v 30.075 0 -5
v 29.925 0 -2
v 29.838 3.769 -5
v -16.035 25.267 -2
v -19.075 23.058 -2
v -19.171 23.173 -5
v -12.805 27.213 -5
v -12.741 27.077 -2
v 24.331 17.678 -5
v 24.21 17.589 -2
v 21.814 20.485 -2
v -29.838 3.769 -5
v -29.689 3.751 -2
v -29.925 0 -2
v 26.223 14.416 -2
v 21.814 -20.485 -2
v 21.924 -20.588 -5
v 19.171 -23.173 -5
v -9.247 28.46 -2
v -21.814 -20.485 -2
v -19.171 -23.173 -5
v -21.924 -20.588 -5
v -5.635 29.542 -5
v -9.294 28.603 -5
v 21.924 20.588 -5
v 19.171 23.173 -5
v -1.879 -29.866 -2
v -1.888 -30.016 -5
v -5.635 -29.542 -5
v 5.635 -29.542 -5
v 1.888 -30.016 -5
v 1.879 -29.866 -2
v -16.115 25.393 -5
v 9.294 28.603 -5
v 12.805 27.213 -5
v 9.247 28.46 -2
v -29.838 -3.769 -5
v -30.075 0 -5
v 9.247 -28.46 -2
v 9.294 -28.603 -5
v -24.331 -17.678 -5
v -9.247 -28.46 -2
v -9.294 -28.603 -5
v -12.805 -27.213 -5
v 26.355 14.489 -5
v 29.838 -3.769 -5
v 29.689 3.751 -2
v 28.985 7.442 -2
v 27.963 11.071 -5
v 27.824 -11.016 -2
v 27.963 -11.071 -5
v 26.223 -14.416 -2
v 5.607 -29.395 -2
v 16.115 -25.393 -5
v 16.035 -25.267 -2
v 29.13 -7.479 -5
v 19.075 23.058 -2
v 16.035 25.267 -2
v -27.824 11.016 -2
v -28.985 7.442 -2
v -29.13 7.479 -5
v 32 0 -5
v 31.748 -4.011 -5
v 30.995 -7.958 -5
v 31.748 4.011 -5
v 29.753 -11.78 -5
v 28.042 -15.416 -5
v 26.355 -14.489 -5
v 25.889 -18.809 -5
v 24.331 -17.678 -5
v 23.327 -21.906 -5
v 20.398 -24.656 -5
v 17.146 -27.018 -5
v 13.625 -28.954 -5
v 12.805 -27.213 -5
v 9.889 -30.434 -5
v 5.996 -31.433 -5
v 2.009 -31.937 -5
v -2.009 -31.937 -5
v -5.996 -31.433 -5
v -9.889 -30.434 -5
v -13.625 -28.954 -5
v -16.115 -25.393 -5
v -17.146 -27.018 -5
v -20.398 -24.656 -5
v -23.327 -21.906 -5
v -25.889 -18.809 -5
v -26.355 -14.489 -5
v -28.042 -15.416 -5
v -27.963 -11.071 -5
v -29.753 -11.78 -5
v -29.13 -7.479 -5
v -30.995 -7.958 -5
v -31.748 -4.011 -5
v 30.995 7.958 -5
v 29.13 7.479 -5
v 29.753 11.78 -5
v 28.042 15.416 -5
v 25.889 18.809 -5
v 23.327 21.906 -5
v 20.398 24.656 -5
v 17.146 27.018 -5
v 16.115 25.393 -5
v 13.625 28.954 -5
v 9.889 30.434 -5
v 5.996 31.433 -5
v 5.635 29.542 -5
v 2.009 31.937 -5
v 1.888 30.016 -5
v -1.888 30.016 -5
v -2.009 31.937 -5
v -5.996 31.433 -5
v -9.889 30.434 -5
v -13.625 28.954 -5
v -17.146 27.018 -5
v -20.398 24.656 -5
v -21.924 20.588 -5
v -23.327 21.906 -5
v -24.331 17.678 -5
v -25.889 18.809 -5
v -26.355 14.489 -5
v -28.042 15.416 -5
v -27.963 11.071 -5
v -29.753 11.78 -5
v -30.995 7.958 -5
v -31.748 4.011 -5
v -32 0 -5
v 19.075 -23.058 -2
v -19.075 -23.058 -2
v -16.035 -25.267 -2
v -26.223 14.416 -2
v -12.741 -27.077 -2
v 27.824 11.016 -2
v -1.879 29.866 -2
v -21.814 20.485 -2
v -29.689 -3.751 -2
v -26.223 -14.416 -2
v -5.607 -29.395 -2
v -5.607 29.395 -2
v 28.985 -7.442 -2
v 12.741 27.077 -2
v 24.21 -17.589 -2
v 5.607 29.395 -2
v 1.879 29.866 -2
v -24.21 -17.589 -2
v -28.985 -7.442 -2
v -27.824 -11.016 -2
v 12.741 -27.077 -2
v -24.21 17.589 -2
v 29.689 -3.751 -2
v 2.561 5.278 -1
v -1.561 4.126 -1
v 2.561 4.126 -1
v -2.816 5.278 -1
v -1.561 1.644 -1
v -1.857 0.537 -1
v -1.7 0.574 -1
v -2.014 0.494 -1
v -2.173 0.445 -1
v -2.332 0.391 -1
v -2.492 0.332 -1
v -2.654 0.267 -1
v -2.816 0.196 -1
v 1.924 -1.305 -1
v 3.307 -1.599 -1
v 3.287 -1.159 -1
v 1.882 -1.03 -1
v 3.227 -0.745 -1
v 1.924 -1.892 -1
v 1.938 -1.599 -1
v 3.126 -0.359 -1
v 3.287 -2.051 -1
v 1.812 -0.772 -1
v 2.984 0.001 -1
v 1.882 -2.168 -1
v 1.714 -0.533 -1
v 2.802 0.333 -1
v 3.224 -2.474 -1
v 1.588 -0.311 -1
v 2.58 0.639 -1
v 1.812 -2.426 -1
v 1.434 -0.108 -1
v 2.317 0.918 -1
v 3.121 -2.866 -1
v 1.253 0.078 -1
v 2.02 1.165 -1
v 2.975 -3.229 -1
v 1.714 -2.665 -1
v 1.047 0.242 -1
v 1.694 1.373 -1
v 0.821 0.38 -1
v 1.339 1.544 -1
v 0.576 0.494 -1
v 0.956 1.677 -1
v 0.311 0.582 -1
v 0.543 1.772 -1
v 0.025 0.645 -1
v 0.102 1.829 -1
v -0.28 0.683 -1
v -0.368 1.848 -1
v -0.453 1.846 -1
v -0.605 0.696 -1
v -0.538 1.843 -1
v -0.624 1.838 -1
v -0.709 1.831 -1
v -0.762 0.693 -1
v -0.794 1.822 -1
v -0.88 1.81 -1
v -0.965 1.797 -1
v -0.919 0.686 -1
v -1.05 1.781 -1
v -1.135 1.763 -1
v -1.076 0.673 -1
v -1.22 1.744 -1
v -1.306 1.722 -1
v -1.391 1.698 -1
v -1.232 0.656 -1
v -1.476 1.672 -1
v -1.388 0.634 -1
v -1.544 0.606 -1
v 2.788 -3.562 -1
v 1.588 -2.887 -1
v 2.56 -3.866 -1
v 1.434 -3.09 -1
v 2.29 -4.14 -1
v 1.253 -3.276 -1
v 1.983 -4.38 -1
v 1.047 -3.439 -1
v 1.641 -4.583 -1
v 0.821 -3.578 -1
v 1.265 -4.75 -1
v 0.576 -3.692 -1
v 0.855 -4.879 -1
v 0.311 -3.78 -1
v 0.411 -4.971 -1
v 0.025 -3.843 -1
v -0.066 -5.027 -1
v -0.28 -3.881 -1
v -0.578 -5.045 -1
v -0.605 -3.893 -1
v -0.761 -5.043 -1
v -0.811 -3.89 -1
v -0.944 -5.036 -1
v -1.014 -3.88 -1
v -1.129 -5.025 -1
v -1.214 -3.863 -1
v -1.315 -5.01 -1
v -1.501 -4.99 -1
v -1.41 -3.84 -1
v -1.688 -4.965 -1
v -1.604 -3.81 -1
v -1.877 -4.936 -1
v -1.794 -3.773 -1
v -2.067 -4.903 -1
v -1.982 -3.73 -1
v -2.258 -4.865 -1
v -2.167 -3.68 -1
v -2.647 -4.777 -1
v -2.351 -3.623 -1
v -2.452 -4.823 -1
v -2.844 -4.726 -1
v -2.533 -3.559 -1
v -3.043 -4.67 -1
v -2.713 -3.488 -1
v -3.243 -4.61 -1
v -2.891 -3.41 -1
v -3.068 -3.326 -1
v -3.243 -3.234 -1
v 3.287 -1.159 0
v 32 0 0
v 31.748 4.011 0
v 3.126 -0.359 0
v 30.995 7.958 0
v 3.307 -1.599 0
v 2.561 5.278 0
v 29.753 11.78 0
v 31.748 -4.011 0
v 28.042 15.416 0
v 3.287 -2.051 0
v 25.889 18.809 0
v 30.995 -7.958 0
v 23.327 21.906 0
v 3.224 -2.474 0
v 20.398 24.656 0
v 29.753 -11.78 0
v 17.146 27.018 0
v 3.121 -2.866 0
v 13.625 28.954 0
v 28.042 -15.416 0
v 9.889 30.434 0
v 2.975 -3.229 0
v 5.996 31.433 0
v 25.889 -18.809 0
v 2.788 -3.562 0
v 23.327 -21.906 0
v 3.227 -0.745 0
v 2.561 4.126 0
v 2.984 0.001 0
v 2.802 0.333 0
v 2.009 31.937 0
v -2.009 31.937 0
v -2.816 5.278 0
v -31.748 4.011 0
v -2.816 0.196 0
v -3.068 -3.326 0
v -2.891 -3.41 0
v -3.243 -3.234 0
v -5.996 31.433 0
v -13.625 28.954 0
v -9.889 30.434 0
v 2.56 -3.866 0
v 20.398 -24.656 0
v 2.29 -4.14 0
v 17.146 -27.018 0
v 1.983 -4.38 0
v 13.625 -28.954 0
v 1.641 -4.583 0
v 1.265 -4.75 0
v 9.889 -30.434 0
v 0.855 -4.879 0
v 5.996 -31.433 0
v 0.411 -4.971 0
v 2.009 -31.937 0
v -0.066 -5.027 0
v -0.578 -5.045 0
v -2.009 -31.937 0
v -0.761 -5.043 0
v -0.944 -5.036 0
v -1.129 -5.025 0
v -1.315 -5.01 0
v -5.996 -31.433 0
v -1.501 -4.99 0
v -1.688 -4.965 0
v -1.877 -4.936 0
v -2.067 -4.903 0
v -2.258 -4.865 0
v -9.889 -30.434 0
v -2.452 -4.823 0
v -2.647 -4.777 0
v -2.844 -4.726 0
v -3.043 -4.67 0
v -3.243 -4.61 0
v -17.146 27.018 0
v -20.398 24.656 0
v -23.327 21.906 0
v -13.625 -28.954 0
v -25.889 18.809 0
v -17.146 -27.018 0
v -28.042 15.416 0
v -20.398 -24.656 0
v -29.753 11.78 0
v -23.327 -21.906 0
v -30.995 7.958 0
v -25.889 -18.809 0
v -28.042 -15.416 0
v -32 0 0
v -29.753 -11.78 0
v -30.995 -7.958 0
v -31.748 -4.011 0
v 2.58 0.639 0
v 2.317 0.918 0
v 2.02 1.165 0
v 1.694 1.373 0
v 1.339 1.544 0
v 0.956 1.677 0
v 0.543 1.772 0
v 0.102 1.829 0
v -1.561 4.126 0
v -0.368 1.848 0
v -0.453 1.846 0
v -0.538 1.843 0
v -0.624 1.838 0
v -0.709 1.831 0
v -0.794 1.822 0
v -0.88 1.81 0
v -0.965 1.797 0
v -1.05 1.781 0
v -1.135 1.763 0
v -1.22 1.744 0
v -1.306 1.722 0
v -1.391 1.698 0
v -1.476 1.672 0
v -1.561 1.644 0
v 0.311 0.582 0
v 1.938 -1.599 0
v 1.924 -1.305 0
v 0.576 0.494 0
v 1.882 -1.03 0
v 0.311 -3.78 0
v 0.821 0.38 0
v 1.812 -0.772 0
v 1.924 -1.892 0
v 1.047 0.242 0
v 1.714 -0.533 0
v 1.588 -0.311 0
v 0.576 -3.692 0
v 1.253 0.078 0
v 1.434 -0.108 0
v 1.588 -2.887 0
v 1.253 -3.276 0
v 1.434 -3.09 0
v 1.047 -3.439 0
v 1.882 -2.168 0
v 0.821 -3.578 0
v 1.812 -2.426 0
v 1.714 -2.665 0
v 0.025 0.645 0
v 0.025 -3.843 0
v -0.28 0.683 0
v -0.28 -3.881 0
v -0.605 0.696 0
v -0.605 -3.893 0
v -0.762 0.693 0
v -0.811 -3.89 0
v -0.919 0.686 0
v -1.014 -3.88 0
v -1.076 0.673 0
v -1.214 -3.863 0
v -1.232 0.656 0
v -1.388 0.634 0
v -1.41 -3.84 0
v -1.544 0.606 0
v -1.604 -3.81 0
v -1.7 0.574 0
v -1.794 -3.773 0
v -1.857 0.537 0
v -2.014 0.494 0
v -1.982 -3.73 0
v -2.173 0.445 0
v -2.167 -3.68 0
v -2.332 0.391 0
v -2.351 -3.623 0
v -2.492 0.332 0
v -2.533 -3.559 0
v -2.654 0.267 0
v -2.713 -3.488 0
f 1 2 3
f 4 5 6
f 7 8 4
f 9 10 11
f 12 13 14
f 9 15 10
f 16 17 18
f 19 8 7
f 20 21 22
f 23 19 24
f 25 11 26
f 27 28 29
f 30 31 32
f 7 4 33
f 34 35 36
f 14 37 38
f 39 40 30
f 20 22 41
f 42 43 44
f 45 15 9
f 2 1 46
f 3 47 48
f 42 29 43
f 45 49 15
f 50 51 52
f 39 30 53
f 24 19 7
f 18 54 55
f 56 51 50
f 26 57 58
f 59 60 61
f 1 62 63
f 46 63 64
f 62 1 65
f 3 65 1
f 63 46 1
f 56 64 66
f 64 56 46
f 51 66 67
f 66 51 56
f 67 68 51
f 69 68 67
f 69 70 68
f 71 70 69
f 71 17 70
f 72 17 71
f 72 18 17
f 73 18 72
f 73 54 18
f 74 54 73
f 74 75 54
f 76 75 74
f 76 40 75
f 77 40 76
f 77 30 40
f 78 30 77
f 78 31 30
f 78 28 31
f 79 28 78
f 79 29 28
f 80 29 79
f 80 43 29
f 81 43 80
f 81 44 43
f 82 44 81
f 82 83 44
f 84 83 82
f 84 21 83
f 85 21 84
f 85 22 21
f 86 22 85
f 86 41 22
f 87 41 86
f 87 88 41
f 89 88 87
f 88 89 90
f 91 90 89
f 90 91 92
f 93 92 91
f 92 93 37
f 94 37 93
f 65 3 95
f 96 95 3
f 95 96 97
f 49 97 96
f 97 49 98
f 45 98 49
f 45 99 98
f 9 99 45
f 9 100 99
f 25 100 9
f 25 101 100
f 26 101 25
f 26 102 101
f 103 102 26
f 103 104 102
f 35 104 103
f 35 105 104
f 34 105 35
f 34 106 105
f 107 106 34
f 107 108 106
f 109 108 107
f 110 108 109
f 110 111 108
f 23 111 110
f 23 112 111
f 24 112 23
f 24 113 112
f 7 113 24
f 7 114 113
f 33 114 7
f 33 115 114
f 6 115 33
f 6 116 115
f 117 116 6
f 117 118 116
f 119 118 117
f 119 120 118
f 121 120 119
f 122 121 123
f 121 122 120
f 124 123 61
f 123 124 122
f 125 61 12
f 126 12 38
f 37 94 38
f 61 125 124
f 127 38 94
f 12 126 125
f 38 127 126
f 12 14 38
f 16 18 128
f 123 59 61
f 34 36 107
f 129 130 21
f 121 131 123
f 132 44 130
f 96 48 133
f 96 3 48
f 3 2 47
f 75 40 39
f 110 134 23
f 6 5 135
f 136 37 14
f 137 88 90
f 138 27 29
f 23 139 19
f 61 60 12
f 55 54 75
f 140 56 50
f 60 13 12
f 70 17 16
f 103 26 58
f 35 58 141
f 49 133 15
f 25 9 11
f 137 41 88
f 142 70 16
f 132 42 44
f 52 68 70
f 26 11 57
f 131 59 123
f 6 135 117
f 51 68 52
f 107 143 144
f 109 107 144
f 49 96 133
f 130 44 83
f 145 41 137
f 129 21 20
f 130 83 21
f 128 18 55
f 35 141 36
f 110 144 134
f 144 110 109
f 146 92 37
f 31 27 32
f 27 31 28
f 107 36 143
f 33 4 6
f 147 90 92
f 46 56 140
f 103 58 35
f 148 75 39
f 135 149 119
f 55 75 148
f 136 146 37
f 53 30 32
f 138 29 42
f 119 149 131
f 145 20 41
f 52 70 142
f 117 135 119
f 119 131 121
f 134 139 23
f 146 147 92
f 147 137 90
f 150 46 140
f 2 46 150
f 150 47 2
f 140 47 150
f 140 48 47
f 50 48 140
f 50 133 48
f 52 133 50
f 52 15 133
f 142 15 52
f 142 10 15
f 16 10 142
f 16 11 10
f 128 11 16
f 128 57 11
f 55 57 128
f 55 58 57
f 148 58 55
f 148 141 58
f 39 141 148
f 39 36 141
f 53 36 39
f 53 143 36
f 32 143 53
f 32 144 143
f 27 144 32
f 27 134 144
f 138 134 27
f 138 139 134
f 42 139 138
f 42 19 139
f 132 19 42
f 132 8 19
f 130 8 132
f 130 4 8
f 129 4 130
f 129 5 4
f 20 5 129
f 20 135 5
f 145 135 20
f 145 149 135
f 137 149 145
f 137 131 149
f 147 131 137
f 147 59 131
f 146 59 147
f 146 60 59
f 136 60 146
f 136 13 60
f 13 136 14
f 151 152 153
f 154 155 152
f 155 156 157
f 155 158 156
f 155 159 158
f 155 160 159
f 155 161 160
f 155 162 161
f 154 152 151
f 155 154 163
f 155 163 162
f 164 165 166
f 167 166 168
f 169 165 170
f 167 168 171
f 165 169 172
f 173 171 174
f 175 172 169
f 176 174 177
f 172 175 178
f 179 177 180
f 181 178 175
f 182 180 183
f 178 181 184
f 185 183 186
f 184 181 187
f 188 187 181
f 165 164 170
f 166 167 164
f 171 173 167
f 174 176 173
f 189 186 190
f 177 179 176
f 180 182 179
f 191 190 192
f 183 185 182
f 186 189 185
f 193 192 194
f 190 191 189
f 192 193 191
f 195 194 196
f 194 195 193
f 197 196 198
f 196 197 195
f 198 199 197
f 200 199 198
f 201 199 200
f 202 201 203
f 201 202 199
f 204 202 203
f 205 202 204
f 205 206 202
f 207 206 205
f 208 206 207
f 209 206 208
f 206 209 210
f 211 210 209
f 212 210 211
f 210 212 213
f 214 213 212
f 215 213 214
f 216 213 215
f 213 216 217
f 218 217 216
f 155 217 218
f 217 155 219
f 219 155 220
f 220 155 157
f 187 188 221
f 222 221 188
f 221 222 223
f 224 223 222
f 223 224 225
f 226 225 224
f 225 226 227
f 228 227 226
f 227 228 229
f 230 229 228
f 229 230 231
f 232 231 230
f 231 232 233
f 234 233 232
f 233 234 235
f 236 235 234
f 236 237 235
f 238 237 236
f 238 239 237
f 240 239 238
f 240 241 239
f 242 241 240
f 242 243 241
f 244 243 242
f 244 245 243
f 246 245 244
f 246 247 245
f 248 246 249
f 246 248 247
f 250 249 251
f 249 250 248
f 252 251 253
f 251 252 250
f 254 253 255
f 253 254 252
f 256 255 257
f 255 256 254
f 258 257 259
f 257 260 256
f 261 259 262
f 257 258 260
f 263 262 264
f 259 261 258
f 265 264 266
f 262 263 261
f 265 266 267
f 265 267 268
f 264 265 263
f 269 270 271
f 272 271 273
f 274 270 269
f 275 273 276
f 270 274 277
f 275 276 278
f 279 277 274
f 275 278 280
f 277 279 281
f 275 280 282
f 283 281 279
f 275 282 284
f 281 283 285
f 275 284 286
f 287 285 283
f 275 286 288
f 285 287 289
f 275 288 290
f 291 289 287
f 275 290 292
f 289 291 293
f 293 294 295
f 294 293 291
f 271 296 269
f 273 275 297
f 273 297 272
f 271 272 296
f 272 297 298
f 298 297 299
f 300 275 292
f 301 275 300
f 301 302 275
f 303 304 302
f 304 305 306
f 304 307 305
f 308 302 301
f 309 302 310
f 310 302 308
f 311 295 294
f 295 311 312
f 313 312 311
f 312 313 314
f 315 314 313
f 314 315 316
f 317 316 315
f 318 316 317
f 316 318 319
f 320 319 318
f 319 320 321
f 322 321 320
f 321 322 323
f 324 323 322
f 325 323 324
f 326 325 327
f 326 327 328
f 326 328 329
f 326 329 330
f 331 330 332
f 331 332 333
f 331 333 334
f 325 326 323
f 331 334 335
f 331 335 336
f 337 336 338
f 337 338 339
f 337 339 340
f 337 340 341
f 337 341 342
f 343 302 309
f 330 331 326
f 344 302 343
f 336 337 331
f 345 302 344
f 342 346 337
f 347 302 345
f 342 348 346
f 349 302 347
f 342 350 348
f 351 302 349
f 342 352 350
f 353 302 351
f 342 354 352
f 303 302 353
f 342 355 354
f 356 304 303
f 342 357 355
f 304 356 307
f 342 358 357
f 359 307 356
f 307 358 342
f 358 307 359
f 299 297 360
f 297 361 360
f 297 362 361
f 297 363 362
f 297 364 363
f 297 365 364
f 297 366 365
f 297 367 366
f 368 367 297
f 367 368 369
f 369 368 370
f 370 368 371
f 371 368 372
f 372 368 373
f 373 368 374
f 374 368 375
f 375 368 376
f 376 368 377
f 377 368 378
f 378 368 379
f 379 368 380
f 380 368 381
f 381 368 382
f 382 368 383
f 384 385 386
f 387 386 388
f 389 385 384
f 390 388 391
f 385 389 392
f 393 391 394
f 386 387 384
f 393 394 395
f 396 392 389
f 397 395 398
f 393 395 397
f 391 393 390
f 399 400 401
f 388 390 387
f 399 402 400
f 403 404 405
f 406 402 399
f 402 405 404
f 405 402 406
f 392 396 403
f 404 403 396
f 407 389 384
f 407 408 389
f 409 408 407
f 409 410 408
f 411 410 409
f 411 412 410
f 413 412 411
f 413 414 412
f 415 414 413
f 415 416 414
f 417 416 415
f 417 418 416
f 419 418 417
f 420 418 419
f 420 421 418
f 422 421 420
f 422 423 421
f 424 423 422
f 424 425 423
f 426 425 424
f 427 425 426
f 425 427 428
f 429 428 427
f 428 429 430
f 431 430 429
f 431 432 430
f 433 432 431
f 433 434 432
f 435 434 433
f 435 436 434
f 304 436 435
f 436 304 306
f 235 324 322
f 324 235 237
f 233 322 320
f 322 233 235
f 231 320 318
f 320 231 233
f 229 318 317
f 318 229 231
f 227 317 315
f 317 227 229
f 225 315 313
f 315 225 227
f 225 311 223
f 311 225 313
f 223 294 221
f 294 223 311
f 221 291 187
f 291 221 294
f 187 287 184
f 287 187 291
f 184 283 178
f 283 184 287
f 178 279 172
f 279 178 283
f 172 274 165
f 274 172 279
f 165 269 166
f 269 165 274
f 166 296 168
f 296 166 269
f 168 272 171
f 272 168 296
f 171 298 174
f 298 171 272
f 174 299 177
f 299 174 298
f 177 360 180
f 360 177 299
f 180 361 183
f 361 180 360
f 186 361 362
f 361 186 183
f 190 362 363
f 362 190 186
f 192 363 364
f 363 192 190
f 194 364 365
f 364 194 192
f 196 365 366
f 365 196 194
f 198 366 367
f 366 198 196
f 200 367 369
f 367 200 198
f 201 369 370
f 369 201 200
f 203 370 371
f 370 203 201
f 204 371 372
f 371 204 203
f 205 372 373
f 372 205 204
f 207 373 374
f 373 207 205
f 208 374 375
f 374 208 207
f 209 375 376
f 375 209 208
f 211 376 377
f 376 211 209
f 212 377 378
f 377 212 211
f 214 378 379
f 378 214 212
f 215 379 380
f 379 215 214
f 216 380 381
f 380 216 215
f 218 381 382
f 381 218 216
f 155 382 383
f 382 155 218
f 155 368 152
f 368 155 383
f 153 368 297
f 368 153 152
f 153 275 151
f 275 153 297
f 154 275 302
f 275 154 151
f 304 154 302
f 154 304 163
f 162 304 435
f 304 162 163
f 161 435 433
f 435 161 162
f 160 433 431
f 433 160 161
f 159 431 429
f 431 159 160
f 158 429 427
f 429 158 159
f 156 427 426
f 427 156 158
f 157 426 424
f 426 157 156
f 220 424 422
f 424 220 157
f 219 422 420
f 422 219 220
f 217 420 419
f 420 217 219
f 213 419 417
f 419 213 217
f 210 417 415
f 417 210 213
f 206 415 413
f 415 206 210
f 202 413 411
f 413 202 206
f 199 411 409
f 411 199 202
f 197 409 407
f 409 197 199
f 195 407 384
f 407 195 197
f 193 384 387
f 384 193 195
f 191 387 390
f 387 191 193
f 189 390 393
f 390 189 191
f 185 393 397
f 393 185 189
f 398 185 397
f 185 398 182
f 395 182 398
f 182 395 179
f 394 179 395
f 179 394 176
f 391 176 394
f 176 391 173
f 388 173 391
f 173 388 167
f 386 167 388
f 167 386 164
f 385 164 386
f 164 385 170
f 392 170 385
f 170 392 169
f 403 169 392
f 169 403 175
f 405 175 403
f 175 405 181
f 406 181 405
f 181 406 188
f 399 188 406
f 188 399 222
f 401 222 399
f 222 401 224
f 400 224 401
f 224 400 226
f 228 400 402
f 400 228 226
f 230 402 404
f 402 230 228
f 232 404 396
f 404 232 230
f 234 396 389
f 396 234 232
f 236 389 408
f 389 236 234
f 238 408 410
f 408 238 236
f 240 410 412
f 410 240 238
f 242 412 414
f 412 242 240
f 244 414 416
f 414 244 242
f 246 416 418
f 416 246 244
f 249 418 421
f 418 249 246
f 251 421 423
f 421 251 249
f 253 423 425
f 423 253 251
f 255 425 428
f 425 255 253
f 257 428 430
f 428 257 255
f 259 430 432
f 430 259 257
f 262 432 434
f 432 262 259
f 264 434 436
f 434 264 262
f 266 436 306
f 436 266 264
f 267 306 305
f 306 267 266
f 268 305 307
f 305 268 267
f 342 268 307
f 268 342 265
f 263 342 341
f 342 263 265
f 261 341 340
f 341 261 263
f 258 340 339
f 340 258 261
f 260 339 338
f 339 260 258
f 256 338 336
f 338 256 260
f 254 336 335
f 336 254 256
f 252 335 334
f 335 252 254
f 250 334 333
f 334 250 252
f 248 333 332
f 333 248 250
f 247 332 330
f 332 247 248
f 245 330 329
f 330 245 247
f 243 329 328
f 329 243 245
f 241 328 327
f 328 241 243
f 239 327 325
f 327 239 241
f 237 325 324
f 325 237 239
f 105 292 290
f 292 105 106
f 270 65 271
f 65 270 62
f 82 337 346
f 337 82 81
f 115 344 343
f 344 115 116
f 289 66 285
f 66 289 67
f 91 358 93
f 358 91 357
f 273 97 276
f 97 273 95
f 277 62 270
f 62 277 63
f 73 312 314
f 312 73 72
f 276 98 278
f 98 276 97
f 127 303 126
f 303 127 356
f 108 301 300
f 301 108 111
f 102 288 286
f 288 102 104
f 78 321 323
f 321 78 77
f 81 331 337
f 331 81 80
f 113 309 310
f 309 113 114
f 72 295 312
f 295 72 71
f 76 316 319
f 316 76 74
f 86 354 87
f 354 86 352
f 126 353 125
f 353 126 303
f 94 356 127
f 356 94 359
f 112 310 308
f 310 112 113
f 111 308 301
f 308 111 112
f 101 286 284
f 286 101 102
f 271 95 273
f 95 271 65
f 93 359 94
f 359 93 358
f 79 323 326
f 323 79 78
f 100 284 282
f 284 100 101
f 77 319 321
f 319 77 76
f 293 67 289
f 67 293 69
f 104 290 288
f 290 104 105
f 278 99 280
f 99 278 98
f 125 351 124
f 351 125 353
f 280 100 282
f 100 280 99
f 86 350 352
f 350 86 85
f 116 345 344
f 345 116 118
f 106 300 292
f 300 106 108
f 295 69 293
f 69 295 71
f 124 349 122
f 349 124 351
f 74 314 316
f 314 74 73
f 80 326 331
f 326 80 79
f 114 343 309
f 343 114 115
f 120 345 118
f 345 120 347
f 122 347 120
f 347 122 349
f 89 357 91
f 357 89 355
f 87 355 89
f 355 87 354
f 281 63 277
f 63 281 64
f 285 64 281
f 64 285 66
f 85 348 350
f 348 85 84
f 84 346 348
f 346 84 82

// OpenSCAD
$fn = 50;


difference() {
	union() {
		translate(v = [0, 0, -5.0000000000]) {
			cylinder(h = 5, r = 32.0000000000);
		}
	}
	union() {
		#translate(v = [0, 0, -5.0000000000]) {
			cylinder(h = 3, r1 = 30.0750000000, r2 = 29.9250000000);
		}
		translate(v = [0, 0, -1]) {
			linear_extrude(height = 1) {
				text(font = "Impact", halign = "center", size = 10, text = "5", valign = "center");
			}
		}
	}
}
